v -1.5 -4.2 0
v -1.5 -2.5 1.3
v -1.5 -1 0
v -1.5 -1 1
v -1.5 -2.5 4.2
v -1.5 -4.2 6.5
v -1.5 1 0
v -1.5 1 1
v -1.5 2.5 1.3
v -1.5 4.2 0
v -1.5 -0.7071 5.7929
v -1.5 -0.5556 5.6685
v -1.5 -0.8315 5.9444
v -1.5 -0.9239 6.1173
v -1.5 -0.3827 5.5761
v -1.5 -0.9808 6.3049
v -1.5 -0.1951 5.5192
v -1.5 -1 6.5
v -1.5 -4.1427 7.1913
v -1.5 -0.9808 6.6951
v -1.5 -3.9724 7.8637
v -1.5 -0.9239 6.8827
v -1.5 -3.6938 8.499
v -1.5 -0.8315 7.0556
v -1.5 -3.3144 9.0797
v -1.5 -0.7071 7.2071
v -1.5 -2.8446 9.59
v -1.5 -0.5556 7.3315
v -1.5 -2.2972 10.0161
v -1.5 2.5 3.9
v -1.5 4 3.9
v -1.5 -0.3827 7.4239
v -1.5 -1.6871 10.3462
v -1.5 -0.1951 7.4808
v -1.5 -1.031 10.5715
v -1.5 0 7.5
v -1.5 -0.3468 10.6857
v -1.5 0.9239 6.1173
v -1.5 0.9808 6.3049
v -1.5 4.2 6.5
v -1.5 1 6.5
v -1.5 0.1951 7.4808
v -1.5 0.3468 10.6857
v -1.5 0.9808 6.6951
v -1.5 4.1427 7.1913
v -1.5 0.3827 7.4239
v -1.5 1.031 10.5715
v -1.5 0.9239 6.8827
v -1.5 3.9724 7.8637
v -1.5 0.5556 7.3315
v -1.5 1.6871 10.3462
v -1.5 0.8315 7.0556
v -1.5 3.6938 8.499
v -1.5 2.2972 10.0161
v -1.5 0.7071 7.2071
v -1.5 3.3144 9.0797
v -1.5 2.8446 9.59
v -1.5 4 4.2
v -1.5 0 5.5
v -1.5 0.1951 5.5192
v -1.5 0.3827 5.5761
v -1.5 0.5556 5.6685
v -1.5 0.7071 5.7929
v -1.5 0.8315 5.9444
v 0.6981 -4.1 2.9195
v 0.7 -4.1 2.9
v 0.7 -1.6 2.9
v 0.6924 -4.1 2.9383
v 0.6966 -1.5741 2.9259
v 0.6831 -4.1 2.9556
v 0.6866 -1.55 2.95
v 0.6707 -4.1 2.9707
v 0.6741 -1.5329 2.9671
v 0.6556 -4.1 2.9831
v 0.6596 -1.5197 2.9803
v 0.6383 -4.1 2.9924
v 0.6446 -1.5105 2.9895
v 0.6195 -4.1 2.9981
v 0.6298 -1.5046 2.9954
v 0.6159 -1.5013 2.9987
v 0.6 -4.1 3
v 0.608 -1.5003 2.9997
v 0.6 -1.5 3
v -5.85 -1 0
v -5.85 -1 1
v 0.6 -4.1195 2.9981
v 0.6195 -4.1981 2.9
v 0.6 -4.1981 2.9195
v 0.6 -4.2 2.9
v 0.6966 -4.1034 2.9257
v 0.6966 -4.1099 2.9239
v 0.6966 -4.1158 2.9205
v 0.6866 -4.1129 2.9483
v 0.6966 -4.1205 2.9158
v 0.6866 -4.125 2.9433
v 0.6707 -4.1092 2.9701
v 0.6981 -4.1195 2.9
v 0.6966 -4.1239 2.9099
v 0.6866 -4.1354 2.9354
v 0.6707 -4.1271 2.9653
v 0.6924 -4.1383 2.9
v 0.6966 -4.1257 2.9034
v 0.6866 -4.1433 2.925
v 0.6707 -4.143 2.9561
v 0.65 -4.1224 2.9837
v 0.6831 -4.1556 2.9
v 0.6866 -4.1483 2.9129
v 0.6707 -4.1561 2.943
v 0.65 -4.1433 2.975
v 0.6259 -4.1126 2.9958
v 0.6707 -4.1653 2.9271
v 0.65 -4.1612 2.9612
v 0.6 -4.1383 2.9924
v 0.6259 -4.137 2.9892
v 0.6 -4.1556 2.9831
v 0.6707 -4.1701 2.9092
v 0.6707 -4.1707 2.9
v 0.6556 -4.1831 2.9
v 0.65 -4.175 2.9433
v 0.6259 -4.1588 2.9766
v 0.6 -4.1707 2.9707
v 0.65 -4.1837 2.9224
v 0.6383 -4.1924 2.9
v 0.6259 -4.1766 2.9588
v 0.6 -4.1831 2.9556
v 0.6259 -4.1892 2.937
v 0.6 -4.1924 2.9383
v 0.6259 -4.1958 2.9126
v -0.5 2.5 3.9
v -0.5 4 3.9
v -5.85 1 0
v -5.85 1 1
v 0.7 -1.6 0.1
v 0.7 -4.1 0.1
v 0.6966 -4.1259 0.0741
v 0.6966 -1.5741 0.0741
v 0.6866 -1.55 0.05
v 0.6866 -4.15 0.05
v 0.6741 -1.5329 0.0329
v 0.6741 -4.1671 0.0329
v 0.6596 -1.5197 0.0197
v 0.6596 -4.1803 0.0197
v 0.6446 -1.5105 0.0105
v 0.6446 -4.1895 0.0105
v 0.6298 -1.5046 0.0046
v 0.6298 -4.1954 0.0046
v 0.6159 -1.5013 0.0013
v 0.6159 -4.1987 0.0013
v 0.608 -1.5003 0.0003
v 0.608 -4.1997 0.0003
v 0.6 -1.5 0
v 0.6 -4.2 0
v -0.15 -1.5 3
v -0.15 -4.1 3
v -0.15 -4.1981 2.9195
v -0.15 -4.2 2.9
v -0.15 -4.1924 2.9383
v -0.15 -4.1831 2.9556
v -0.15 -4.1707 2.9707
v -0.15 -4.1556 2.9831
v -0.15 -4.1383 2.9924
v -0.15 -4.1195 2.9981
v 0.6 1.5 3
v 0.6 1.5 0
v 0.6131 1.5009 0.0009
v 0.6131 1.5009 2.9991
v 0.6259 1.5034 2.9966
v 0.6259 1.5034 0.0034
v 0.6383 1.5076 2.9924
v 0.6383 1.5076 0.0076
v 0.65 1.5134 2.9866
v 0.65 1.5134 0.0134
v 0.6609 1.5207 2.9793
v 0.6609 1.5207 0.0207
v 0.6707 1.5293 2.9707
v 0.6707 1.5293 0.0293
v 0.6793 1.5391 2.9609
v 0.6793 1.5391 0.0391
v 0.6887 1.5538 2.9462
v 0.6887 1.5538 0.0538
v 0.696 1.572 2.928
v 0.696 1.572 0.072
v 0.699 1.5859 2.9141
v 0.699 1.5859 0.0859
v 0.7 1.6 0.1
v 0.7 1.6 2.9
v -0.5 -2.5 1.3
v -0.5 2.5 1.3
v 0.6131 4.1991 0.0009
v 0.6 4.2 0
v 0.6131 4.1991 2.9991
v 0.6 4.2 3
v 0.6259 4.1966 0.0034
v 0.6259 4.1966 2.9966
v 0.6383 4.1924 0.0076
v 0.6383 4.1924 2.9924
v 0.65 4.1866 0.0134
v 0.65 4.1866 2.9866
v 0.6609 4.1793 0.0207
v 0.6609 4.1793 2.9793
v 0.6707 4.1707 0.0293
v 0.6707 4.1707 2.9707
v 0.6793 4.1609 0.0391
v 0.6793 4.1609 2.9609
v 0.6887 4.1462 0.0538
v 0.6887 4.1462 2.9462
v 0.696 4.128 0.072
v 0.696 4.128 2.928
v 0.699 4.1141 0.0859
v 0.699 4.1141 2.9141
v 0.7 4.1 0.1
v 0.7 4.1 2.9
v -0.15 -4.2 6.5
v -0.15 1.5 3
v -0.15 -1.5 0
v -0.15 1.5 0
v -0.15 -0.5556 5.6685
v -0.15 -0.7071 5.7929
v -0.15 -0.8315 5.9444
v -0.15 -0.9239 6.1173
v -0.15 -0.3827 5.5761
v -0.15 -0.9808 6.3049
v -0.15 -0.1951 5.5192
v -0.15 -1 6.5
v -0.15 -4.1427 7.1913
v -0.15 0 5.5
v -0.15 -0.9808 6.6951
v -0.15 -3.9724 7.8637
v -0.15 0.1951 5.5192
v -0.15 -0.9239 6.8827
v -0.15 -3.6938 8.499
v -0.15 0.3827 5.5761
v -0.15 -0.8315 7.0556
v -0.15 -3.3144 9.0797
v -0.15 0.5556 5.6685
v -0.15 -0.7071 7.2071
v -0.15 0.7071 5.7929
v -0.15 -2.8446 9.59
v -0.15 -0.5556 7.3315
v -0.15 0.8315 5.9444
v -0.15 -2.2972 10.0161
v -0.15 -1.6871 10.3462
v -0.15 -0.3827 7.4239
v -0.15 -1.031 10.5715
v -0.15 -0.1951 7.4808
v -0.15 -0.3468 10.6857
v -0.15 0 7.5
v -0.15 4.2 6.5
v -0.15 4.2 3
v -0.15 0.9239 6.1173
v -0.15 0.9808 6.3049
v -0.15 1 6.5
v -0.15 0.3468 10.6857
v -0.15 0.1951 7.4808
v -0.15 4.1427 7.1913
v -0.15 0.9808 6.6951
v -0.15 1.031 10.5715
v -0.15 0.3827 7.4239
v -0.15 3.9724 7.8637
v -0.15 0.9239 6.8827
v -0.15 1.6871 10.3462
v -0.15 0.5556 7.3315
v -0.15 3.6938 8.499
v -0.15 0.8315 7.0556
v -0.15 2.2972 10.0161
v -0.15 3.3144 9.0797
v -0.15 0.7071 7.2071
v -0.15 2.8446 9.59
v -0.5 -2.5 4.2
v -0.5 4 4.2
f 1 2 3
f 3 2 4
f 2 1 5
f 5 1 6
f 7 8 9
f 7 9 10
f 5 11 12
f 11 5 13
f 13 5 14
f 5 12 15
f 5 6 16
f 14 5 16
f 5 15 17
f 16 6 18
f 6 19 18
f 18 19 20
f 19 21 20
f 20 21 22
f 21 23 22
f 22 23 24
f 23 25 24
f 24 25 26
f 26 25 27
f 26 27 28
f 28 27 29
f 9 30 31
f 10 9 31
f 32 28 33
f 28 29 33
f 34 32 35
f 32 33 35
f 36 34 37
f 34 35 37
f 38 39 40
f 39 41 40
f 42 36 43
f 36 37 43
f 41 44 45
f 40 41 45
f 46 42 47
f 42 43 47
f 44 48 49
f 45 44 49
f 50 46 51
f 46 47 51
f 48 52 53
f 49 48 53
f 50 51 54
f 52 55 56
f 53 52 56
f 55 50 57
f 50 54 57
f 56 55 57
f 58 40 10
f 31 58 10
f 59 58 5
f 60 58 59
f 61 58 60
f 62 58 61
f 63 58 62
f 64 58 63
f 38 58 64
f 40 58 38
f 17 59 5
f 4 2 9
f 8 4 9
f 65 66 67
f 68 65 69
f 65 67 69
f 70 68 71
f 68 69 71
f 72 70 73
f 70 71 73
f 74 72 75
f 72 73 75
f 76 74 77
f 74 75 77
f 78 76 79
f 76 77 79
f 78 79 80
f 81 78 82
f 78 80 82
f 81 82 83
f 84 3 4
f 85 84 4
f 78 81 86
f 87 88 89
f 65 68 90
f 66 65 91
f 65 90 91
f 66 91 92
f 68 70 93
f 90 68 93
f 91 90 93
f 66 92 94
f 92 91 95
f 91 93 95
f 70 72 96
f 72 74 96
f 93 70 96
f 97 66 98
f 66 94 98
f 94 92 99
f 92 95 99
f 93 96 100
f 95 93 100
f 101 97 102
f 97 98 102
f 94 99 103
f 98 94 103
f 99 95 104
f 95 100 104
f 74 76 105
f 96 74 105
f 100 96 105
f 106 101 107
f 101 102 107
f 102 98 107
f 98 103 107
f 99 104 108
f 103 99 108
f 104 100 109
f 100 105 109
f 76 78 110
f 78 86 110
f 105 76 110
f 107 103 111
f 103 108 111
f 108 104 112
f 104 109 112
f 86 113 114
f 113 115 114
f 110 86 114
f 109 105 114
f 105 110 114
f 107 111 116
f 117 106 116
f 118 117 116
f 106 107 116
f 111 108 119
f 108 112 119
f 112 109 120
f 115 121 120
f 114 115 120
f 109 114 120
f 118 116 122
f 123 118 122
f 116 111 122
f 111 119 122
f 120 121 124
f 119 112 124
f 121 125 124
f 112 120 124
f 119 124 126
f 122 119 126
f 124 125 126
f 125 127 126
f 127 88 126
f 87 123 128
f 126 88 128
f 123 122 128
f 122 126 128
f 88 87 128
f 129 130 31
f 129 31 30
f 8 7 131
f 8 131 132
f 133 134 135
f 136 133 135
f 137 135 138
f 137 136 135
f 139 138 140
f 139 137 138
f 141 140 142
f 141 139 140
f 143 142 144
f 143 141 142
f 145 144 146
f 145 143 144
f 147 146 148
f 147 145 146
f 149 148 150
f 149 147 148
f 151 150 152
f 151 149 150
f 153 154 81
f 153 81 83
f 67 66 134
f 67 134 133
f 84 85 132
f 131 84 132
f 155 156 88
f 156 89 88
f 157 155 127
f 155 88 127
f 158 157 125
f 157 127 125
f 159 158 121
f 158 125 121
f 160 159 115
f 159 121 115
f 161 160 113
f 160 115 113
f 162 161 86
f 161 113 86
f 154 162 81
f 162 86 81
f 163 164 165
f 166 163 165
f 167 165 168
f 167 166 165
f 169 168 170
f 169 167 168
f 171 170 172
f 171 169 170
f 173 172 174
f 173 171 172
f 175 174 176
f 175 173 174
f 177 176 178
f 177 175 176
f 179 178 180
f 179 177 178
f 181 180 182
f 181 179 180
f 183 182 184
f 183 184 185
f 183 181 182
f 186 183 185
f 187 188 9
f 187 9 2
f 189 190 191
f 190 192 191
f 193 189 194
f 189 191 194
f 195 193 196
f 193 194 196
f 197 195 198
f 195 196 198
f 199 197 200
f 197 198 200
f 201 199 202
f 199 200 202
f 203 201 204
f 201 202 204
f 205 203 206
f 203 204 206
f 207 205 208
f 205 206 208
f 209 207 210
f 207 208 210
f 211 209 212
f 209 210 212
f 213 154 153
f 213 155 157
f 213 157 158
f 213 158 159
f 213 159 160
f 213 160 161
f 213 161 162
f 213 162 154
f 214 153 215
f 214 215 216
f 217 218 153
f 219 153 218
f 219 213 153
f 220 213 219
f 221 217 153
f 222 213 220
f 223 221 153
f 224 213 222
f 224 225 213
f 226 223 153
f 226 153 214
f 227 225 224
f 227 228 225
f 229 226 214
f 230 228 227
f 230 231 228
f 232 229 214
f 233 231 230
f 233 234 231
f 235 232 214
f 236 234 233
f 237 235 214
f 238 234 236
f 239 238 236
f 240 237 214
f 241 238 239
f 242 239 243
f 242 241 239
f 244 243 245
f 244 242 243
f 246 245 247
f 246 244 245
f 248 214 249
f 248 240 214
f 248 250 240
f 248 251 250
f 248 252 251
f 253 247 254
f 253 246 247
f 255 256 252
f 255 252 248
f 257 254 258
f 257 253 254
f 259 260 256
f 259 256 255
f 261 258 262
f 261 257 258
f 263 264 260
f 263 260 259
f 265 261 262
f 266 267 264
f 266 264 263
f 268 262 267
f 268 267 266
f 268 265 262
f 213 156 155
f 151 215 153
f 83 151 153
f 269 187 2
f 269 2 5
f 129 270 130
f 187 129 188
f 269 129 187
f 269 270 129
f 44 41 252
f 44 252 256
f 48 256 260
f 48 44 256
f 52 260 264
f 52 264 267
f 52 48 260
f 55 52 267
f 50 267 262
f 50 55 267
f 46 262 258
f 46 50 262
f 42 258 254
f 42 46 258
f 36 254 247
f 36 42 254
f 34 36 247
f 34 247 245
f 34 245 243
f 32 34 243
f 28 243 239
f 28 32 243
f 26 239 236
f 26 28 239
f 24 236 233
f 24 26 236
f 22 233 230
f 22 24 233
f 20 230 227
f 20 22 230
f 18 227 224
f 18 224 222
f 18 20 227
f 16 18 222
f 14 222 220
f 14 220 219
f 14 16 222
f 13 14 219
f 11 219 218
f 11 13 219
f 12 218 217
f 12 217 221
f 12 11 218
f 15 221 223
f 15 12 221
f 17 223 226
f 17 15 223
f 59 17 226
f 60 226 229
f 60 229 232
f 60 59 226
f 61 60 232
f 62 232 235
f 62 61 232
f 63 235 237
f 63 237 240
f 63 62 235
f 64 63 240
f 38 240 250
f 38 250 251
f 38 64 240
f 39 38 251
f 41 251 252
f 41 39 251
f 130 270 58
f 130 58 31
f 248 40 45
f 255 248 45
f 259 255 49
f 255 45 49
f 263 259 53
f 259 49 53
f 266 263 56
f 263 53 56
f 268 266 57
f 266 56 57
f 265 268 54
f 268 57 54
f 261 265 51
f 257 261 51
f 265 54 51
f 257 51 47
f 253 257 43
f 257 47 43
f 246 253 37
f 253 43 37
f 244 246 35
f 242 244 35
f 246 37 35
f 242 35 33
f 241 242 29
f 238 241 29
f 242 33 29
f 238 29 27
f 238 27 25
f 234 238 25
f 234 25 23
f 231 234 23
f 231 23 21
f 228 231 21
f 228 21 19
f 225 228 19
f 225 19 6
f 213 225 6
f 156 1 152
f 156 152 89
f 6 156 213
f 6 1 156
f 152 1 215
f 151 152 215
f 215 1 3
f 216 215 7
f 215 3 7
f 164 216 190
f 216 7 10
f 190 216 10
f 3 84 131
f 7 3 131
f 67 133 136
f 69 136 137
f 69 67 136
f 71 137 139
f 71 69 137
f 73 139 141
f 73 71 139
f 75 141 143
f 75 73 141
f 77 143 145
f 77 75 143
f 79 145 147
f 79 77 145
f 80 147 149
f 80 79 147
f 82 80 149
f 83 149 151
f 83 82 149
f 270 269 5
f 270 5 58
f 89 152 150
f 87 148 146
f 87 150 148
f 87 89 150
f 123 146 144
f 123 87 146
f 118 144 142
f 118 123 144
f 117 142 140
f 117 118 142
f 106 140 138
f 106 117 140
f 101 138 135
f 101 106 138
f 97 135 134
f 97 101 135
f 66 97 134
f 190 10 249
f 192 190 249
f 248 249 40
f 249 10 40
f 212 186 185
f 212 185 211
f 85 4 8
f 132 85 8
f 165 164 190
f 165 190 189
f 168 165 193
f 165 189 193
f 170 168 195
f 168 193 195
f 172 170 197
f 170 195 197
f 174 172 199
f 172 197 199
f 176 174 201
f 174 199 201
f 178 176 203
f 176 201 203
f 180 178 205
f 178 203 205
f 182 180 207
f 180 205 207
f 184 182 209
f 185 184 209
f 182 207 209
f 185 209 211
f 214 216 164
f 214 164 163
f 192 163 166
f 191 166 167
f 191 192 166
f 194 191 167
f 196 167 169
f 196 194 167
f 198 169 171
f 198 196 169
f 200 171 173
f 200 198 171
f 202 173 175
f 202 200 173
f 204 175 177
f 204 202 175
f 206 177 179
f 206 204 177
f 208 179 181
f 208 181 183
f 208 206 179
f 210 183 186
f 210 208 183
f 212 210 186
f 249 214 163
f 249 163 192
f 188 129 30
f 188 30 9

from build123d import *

# Parameters (mm, degrees)
SKETCH039_R     = 1
PAD010_DEPTH    = 1.35
SKETCH041_W     = 2
SKETCH041_H     = 1
PAD014_DEPTH    = 4.35
SKETCH040_W     = 2.7
SKETCH040_H     = 3
PAD015_DEPTH    = 0.85
POCKET015_DEPTH = 5.351
FILLET_R        = 0.1


with BuildPart() as part:
    # Sketch039 → Pad010 (new body)
    with BuildSketch(Plane.YZ.offset(-1.5)):
        with BuildLine():
            ThreePointArc((4.2, 7), (0, 11.2), (-4.2, 7))
            Line((-4.2, 7), (-4.2, 0.5))
            Line((-4.2, 0.5), (4.2, 0.5))
            Line((4.2, 0.5), (4.2, 7))
        make_face()
        with Locations((0, 7)):
            Circle(SKETCH039_R, mode=Mode.SUBTRACT)
    extrude(amount=PAD010_DEPTH)

    # Sketch041 → Pad014 (join)
    with BuildSketch(Plane.YZ.offset(-1.5)):
        with Locations((0, 1)):
            Rectangle(SKETCH041_W, SKETCH041_H)
    extrude(amount=-PAD014_DEPTH)

    # Sketch040 (on Face7 of Pad010) → Pad015 (join)
    with BuildSketch(Plane.YZ.offset(-0.15)):
        with Locations((-2.85, 2)):
            Rectangle(SKETCH040_W, SKETCH040_H)
        with Locations((2.85, 2)):
            Rectangle(SKETCH040_W, SKETCH040_H)
    extrude(amount=PAD015_DEPTH)

    # Sketch055 → Pocket015 (cut, through all)
    with BuildSketch(Plane.YZ.offset(-0.5)):
        Polygon((-2.5, 4.7), (4, 4.7), (4, 4.4), (2.5, 4.4), (2.5, 1.8), (-2.5, 1.8), align=None)
    extrude(amount=-POCKET015_DEPTH, mode=Mode.SUBTRACT)

    # Fillet
    fillet_edges = [part.edges().sort_by_distance(p)[0] for p in [
        (0.275, -4.2, 3.5),
        (0.7, -2.85, 3.5),
        (0.7, -1.5, 2),
        (0.7, -2.85, 0.5),
        (0.7, -4.2, 2),
        (0.7, 2.85, 3.5),
        (0.7, 4.2, 2),
        (0.7, 2.85, 0.5),
        (0.7, 1.5, 2),
    ]]
    fillet(fillet_edges, radius=FILLET_R)


with BuildPart() as part_1:
    # Body010 placement: moved
    add(part.part.moved(Location((0, 0, -0.5))))


solid = part_1.part
